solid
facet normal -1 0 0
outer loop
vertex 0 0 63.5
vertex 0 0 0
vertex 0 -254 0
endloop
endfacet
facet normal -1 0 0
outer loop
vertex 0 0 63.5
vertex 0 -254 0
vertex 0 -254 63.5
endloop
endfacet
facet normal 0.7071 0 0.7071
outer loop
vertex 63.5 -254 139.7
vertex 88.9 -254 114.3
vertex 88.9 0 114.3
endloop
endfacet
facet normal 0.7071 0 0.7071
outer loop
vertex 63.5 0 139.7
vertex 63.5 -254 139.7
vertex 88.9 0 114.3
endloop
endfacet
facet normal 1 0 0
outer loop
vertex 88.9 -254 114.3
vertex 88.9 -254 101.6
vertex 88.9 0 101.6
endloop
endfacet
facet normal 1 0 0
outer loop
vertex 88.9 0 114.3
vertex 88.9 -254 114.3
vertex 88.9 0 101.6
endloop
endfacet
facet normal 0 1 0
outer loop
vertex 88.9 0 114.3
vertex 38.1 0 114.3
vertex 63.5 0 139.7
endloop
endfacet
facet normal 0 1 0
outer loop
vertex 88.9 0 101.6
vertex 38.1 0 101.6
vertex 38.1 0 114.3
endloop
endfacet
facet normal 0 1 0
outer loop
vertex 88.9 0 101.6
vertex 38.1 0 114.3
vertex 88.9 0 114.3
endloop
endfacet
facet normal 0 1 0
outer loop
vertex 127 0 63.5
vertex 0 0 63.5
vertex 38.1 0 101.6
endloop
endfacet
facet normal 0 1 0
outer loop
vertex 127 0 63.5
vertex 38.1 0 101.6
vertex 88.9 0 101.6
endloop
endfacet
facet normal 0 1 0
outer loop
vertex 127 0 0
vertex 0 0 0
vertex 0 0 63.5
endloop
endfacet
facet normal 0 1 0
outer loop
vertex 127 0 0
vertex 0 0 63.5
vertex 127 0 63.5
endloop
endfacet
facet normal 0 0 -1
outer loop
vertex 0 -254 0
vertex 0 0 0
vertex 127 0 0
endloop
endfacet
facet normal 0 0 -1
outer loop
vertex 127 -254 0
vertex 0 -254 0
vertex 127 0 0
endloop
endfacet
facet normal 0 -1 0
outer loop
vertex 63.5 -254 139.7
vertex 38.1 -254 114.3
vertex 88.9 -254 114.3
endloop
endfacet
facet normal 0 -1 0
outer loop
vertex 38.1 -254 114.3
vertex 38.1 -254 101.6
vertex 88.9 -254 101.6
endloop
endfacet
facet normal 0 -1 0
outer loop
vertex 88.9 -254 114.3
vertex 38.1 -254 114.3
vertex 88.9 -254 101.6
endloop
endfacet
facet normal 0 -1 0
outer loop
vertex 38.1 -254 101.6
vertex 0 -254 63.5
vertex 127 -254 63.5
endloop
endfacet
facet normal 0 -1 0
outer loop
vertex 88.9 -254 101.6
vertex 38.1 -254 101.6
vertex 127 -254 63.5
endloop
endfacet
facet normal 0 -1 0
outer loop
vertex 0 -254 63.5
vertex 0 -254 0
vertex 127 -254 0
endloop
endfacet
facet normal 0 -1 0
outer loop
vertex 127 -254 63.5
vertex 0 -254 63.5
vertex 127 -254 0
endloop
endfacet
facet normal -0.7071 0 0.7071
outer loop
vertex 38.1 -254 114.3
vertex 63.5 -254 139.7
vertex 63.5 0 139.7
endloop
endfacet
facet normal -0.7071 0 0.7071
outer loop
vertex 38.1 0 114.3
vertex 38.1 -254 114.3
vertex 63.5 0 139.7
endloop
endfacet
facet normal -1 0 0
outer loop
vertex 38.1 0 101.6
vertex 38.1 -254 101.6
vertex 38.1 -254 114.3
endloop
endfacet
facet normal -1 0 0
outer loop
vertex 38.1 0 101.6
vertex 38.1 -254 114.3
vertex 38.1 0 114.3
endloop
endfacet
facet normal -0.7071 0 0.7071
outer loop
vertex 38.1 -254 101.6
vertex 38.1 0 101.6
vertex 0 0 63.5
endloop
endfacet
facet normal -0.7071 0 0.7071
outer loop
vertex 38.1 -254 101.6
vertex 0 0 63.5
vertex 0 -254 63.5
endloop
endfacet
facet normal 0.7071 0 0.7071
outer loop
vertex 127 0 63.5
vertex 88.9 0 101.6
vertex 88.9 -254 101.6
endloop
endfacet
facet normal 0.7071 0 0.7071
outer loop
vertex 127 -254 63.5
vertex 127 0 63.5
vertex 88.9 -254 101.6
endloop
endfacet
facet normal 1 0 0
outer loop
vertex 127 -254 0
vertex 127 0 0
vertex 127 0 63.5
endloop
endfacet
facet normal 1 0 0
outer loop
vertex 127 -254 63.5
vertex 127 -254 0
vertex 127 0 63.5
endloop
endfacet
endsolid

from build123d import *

# Parameters (mm, degrees)
F0_W     = 127
F0_H     = 101.6
F1_DEPTH = 254
F2_SIZE  = 38.1
F3_W     = 50.8
F3_H     = 254
F4_DEPTH = 38.1
F5_SIZE  = 25.39999


# Not quite as in the source:
# - a fillet or chamfer is up to 0.001 mm smaller than in the source, because OpenCascade refuses the exact size


with BuildPart() as f1:
    # F0 (on Front) → F1 (new body)
    with BuildSketch(Plane.XZ):
        with Locations((63.5, 50.8)):
            Rectangle(F0_W, F0_H)
    extrude(amount=F1_DEPTH)

    # F2
    f2_edges = [f1.edges().sort_by_distance(p)[0] for p in [
        (127, -127, 101.6),
        (0, -127, 101.6),
    ]]
    chamfer(f2_edges, length=F2_SIZE)

    # F3 (on face) → F4 (join)
    with BuildSketch(Plane.XY.offset(101.6)):
        with Locations((63.5, -127)):
            Rectangle(F3_W, F3_H)
    extrude(amount=F4_DEPTH)

    # F5 (size 25.4 in the source; OpenCascade refuses exactly that, so slightly less here)
    f5_edges = [f1.edges().sort_by_distance(p)[0] for p in [
        (38.1, -127, 139.7),
        (88.9, -127, 139.7),
    ]]
    chamfer(f5_edges, length=F5_SIZE)


solid = f1.part
